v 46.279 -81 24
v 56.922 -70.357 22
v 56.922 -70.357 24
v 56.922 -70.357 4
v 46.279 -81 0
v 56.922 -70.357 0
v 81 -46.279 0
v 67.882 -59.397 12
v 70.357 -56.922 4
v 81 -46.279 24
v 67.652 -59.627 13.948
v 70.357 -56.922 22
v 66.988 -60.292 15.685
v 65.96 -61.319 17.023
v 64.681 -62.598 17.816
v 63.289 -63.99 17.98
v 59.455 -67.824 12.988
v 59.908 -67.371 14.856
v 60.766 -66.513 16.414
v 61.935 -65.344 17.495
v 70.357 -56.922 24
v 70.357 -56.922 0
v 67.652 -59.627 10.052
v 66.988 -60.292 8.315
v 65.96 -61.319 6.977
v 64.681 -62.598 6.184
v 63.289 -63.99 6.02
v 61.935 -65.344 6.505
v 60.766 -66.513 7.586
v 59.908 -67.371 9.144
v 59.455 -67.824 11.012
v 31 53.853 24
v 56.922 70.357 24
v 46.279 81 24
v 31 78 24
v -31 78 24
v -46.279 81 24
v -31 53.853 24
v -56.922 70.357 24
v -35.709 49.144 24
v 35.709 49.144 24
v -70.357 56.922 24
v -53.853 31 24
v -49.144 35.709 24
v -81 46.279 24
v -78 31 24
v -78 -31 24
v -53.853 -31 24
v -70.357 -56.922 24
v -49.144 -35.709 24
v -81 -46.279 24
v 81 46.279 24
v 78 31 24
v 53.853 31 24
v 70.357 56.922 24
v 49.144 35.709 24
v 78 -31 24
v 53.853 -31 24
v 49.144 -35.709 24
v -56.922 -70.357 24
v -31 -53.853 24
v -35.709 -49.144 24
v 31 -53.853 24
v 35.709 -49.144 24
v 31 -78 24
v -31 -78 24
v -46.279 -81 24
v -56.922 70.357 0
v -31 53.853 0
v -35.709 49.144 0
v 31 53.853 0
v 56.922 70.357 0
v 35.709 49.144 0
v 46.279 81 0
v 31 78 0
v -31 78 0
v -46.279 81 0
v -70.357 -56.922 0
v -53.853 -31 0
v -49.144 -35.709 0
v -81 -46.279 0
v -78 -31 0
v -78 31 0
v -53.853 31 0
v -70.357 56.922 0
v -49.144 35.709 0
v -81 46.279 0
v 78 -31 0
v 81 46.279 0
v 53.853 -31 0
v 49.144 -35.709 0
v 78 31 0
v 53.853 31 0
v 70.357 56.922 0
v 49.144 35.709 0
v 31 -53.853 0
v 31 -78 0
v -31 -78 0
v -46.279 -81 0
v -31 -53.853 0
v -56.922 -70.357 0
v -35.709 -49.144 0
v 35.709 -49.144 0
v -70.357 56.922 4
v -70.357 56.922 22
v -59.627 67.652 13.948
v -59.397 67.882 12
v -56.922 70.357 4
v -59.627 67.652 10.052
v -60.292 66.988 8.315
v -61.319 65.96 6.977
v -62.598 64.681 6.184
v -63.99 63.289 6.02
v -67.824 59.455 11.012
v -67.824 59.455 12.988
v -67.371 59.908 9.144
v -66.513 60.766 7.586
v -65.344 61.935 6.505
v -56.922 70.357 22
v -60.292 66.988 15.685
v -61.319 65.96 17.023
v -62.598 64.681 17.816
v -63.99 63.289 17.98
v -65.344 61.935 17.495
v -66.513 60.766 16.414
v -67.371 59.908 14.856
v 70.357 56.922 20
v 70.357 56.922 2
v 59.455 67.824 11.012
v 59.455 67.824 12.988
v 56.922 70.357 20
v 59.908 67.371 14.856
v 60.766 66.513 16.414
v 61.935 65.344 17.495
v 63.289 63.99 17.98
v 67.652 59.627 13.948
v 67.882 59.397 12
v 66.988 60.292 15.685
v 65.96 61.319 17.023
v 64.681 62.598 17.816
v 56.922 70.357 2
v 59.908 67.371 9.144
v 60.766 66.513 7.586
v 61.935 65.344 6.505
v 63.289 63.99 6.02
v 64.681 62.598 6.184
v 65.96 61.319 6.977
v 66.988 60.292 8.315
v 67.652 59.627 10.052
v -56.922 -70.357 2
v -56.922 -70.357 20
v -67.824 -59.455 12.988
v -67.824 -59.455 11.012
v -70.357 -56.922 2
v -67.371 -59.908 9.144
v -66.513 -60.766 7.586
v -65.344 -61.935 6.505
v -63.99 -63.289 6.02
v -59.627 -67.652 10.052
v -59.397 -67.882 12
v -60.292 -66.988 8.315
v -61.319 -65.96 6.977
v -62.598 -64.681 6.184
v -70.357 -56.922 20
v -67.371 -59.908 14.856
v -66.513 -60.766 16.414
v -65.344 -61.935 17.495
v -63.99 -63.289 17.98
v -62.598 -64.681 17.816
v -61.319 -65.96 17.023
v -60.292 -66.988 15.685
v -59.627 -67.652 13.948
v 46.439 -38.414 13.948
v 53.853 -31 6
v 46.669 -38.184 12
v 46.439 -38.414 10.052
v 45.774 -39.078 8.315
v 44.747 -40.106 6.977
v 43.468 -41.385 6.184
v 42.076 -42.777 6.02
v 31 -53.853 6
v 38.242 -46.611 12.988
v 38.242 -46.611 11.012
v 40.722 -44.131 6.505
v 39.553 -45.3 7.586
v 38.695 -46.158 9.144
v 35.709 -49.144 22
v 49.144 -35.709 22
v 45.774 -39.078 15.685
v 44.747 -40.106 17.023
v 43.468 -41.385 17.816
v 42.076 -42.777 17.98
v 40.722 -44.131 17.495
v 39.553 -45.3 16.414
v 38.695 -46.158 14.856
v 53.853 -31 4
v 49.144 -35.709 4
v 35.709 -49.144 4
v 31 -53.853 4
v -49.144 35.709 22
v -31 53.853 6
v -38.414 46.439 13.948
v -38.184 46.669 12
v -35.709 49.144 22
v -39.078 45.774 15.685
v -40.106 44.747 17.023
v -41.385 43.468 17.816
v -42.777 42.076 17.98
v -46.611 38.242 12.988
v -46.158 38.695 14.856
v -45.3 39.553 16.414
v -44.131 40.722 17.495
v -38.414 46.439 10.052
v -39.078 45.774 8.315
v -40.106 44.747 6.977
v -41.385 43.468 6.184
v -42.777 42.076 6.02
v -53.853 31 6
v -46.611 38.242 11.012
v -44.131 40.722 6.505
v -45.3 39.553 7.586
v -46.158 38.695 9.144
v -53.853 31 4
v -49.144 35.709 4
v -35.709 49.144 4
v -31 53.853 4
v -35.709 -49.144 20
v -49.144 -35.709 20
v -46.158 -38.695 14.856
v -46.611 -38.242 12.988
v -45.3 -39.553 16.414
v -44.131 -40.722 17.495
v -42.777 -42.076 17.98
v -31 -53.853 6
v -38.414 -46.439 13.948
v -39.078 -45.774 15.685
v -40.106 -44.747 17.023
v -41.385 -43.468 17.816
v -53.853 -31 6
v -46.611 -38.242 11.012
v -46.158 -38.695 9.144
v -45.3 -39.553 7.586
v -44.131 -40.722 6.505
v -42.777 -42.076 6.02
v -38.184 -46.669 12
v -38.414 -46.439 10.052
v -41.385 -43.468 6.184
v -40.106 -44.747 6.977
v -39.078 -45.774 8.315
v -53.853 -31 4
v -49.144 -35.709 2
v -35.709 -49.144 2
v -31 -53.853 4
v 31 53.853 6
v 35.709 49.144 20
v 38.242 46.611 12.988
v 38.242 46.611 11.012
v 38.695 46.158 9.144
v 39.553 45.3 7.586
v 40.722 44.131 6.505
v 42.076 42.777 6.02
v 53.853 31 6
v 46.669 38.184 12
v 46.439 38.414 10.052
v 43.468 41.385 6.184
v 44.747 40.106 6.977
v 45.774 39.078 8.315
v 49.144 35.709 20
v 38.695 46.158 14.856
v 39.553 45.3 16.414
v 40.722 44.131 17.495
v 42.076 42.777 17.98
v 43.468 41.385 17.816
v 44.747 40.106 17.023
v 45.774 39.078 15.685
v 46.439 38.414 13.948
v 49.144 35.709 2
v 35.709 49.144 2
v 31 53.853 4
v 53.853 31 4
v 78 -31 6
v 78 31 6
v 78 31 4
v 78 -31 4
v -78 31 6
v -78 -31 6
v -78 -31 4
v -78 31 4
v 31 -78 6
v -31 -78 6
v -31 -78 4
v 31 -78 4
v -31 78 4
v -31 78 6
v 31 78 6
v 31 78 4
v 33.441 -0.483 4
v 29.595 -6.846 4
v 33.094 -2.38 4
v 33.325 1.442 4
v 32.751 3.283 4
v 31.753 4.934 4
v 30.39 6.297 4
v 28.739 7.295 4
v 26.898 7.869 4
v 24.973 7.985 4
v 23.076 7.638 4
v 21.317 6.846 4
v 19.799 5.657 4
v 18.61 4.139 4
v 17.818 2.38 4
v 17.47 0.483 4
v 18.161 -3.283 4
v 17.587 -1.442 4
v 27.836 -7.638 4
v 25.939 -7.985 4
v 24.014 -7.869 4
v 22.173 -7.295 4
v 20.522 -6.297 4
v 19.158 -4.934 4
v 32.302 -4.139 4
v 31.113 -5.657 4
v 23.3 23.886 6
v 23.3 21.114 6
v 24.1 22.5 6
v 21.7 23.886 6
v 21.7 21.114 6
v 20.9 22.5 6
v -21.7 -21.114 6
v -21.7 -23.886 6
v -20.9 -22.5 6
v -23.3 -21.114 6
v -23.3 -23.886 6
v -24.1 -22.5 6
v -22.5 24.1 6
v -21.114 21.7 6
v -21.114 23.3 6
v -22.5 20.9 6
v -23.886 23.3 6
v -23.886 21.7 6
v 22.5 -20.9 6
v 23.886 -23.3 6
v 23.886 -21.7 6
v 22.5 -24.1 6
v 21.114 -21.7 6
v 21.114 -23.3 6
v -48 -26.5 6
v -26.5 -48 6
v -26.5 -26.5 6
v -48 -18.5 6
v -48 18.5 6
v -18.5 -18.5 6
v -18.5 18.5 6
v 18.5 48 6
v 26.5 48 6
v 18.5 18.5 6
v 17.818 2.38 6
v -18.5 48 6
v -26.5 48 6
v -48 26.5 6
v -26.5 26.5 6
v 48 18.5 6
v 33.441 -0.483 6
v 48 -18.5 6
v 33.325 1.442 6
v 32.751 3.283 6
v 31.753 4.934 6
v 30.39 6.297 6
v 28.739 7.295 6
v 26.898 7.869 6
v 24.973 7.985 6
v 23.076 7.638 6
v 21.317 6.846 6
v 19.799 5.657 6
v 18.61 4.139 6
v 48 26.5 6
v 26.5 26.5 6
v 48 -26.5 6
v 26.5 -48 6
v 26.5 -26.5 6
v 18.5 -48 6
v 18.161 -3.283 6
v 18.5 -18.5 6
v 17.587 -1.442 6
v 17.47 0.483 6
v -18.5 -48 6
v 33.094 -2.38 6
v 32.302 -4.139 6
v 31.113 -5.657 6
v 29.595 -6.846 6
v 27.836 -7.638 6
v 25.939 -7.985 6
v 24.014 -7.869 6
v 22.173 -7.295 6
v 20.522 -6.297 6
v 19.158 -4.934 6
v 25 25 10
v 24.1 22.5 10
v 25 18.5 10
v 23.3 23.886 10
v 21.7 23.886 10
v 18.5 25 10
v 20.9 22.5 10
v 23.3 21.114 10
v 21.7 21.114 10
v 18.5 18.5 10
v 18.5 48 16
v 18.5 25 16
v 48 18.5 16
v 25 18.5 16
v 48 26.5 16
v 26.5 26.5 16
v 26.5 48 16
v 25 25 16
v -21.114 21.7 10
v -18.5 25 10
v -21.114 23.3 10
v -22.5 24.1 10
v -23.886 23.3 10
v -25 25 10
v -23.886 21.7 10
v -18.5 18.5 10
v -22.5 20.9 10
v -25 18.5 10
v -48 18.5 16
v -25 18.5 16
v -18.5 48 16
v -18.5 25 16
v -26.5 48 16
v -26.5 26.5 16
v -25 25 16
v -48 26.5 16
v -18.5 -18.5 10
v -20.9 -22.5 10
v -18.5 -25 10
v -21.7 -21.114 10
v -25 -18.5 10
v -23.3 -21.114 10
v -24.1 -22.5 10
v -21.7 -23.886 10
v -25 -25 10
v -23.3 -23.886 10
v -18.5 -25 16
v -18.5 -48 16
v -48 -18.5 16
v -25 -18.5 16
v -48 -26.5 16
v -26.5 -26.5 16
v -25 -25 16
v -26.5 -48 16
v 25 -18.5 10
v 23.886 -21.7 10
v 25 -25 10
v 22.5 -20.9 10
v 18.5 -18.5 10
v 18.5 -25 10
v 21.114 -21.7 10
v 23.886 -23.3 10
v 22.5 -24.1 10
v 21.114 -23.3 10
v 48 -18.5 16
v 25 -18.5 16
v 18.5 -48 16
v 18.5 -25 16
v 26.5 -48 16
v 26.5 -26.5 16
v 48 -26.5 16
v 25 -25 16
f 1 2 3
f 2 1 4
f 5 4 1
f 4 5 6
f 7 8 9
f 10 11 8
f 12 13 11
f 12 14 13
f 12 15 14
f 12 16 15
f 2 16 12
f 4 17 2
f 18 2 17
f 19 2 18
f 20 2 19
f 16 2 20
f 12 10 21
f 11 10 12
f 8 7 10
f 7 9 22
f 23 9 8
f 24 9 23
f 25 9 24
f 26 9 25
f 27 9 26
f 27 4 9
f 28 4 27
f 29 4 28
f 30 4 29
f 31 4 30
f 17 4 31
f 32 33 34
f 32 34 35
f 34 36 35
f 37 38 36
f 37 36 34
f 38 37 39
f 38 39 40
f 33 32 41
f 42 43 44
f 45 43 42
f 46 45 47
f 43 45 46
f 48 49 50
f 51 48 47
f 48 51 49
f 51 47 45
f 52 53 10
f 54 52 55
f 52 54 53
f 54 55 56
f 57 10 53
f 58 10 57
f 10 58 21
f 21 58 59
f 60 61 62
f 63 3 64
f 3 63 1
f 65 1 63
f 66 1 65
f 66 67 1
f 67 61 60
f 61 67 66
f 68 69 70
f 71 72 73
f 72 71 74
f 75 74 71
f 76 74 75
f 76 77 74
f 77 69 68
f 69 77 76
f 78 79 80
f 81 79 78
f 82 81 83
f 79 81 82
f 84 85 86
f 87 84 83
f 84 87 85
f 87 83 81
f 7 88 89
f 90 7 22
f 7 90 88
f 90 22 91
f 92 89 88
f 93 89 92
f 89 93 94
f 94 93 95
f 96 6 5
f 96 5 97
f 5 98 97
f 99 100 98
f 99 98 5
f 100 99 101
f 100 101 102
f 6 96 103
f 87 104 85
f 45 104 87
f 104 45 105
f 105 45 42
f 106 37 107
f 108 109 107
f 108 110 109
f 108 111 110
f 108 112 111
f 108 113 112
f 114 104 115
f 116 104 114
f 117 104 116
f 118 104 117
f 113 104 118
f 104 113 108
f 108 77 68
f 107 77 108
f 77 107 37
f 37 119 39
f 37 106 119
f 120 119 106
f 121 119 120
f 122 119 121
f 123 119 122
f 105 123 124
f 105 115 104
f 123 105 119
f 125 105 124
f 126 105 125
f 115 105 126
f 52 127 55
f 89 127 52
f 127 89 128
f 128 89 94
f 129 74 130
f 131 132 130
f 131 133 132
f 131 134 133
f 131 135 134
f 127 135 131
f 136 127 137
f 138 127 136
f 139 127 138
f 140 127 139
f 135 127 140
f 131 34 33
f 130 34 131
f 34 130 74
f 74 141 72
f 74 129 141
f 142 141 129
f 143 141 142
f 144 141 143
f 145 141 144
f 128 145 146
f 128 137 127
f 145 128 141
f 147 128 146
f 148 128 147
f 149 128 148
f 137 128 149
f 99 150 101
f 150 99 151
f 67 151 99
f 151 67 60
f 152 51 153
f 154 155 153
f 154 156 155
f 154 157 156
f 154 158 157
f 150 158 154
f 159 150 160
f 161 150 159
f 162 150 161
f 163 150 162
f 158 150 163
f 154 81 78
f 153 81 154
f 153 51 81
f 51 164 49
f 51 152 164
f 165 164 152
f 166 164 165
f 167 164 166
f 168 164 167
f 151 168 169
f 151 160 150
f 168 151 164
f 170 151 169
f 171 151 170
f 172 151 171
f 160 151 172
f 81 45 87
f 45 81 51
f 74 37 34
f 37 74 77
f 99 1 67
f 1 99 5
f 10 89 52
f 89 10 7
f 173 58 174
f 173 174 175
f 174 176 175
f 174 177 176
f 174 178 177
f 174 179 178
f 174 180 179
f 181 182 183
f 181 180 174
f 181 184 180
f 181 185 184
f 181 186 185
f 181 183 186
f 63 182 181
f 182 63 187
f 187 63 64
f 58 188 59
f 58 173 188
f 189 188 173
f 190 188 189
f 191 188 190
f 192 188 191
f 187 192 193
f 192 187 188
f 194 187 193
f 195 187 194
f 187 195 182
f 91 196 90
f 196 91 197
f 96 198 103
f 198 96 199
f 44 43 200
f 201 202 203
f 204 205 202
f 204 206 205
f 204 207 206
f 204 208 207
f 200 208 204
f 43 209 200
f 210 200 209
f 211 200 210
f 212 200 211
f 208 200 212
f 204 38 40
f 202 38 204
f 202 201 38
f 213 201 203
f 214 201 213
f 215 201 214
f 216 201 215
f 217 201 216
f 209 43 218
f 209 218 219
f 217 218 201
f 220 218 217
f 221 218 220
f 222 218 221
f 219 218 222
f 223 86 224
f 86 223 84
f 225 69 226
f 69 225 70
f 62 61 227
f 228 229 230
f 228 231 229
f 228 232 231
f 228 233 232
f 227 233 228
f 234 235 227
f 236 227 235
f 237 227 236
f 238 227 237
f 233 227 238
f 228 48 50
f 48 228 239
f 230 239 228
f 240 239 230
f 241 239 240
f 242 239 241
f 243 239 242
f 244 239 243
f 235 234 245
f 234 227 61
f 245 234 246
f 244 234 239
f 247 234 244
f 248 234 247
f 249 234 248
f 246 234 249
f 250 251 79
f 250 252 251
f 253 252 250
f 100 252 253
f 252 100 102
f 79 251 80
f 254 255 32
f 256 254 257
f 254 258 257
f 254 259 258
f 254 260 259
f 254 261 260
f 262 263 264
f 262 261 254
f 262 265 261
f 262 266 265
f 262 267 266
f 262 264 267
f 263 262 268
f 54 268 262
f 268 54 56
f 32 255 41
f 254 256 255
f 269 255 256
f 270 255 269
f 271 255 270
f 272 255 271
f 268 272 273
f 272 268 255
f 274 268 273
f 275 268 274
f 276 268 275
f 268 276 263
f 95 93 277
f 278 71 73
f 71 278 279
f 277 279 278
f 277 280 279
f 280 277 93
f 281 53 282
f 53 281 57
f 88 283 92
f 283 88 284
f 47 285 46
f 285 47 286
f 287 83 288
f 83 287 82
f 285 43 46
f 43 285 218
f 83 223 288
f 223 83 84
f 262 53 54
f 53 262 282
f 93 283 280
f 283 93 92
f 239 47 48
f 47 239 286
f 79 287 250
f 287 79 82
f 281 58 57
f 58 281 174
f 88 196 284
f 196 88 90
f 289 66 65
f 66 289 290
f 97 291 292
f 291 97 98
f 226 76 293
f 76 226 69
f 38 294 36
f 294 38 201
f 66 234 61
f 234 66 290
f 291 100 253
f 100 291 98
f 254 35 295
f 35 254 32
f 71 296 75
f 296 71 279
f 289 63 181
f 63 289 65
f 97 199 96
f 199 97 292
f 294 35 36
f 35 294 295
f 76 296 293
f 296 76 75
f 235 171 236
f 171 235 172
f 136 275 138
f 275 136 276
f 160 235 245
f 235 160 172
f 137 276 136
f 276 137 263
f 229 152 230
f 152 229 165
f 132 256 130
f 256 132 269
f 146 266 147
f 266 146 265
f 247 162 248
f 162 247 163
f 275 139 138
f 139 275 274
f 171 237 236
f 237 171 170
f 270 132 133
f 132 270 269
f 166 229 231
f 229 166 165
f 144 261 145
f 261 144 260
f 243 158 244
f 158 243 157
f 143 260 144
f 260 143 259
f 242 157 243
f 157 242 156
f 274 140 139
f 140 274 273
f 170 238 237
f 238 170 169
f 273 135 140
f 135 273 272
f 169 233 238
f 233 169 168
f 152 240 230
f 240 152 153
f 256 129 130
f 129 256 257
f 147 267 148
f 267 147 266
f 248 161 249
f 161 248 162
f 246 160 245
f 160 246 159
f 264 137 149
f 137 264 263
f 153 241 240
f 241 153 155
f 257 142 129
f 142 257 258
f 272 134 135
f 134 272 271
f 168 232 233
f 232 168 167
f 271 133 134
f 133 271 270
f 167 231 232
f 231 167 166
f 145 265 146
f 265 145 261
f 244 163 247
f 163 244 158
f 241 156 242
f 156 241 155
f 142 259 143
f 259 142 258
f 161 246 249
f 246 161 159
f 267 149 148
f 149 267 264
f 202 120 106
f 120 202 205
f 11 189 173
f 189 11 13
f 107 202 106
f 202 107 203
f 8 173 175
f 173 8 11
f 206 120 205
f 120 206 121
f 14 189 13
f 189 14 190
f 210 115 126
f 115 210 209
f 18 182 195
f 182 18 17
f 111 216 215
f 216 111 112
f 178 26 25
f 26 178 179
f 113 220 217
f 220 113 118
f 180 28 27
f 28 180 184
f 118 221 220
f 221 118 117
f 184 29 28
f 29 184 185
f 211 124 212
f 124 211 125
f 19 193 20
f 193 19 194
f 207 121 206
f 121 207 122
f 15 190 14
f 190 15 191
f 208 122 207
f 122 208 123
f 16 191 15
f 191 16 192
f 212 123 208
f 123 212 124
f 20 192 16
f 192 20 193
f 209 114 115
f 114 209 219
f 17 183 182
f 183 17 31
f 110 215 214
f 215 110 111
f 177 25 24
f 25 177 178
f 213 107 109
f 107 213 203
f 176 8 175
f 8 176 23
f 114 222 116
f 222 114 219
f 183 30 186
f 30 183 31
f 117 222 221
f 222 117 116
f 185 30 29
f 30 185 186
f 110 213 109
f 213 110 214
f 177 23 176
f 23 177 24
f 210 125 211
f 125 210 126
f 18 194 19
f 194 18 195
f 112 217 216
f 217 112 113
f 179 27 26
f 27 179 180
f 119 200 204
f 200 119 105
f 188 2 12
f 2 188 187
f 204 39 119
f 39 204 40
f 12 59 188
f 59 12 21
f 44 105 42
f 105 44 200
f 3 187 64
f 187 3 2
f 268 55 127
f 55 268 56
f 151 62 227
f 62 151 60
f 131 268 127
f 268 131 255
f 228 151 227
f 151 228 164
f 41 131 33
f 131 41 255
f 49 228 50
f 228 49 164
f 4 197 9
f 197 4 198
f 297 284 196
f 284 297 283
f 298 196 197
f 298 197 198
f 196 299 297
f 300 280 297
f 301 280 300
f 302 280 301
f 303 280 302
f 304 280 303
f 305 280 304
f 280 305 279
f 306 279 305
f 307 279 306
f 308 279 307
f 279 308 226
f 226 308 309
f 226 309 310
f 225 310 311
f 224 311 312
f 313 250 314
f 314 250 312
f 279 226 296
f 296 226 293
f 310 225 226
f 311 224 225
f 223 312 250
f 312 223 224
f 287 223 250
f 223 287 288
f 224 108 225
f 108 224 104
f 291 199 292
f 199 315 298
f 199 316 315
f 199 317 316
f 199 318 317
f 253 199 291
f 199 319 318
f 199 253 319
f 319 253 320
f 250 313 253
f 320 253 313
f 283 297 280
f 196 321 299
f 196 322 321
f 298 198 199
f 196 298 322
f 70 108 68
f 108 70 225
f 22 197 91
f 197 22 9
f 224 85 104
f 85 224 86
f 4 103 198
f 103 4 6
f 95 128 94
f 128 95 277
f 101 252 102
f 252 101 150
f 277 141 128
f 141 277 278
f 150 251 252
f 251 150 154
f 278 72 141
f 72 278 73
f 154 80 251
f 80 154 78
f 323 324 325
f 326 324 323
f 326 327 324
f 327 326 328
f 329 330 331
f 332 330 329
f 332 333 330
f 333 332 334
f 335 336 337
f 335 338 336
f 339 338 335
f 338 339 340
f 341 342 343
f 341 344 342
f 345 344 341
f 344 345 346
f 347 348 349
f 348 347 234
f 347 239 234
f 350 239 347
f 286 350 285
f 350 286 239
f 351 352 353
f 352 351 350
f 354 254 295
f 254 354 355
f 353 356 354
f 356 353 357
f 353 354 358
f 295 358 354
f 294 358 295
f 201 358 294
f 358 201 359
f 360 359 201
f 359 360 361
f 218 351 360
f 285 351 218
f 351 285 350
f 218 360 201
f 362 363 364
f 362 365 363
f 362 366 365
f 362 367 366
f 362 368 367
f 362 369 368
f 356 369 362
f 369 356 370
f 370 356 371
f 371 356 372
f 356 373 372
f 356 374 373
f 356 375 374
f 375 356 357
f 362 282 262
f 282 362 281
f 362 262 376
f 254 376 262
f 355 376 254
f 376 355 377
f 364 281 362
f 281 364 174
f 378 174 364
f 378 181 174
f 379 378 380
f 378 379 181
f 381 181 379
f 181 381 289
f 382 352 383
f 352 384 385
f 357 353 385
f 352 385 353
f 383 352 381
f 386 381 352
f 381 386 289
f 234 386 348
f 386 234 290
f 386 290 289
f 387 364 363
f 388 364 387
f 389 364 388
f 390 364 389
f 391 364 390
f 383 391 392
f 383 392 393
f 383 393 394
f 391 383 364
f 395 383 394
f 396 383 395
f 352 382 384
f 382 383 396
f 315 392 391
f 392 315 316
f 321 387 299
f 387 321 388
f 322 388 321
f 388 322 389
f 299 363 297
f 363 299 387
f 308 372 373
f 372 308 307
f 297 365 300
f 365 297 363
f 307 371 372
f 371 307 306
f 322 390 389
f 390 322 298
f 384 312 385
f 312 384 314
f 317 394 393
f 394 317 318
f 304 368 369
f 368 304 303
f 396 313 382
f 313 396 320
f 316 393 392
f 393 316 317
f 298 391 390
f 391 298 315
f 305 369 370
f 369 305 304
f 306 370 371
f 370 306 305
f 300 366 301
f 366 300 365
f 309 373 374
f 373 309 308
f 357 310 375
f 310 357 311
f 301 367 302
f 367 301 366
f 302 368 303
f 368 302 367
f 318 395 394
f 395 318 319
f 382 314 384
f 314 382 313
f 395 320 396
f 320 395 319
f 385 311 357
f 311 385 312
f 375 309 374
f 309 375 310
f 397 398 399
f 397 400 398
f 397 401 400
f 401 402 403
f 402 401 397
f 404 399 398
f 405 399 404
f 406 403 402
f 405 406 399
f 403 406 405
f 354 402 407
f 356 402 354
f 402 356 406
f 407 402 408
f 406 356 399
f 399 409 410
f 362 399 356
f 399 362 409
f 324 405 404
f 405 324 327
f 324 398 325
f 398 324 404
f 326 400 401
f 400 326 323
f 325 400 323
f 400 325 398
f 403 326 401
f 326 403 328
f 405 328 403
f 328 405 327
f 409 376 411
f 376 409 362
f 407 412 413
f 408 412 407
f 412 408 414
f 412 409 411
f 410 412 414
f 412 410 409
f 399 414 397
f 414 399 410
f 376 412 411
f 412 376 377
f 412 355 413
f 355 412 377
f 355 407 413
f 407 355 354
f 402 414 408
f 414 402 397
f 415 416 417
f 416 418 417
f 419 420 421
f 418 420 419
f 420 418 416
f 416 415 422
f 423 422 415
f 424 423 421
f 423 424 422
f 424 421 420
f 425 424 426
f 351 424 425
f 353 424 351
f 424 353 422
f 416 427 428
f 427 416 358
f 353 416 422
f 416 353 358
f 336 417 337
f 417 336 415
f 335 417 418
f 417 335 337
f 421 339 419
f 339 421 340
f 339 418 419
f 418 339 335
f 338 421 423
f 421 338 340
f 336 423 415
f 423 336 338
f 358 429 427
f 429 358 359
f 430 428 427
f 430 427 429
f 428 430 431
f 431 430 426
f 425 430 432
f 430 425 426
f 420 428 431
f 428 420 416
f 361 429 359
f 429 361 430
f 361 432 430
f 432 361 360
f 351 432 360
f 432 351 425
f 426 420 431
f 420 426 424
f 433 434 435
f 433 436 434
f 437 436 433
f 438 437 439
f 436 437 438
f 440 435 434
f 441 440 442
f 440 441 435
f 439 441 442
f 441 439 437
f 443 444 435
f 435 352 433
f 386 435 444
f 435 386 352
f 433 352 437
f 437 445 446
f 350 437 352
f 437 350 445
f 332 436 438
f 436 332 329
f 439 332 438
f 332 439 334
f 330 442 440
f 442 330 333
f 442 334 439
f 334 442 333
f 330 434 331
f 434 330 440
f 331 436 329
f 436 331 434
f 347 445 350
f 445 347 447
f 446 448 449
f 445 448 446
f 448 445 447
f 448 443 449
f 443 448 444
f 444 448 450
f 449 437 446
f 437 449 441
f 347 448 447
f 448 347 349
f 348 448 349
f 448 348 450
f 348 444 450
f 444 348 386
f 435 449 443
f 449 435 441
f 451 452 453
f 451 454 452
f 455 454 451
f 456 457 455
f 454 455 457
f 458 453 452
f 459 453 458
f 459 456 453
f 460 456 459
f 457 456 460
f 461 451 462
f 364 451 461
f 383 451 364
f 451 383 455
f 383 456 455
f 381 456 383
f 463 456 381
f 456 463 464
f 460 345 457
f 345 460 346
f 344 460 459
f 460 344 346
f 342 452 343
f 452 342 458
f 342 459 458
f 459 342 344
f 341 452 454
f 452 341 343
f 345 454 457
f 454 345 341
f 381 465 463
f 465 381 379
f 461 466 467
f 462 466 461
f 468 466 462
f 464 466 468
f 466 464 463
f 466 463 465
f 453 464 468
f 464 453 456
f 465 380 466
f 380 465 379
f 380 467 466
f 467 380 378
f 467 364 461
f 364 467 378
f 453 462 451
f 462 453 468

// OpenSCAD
// file: ../lib/JMO_library.scad
/* MAGNOLIO QUADCOPTER

FILE: JMO_library.scad

AUTHOR: Jose Manuel Ortiz

DESCRIPTION:
General purpose primitive modules

LICENSE:
Magnolio by Kinamics is licensed under a Creative Commons Attribution-ShareAlike 4.0 International License.
http://creativecommons.org/licenses/by-sa/4.0/
*/

//an open case with open base, wall width d and chamfer specified by d1
module case_base_open(l=160, h=32, w=55, d=4, d1=2){
	h1 = sqrt(w*w/4+h*h);
	h2 = h1-d1-d;
	x1 = w*h1/(2*h2);
	y1 = h*h1/h2;
	x2 = d1*w/(2*h1);
	alpha = atan(2*h/w);
	//echo("h1=",h1," h2=",h2," x1=",x1," y1=",y1," x2=",x2, " alpha=",alpha);
	
	rotate([90,0,0])
	translate([0,0,-l/2])
	difference(){
		union(){
			//main box
			translate([w/2,0,0]) cube([d,h,l]);
			translate([0,d/2+h,l/2]) cube([w+2*d,d,l],center=true);
			translate([-w/2-d,0,0]) cube([d,h,l]);
			
			//chamfers
			rotate([0,0,90-alpha])
				translate([0,h2+d/2+d,l/2])
					cube([2*x2+2*d,d,l],center=true);
			rotate([0,0,-90+alpha])
				translate([0,h2+d/2+d,l/2])
					cube([2*x2+2*d,d,l],center=true);
		}
		//remove excess
		rotate([0,0,90-alpha])
				translate([0,h2+3*d,l/2])
					cube([2*x2+2*d,2*d,l+1],center=true);
		rotate([0,0,-90+alpha])
				translate([0,h2+3*d,l/2])
					cube([2*x2+2*d,2*d,l+1],center=true);
		translate([w/2+d,0,-0.5]) cube([d,h+2*d,l+1]);
		translate([0,d+d/2+h,l/2]) cube([w+2*d,d,l+1],center=true);
		translate([-w/2-2*d,0,-0.5]) cube([d,h+3*d,l+1]);
	}
}
//case_base_open();

//Pyramid module: generalization of Openscad manual example
module pyramid_square_base(w=10, l=10, h=10){
	polyhedron(
		points=[ [w/2,l/2,0],[w/2,-l/2,0],[-w/2,-l/2,0],[-w/2,l/2,0], // the four points at base
           [0,0,h]  ],                                 // the apex point 
  faces=[ [0,1,4],[1,2,4],[2,3,4],[3,0,4],              // each triangle side
              [1,0,3],[2,1,3] ]);                         // two triangles for square base
}
//pyramid_square_base(w=150, l=150, h=60);
// main file
/*
Drone Main Body

Print settings (Sli3r v1.1.7):
- Black ABS, 3mm filament
- layer height: 0.3
- perimeters: 4
- Solid layers: 4 (top), 4 (bottom)
- Infill: 25% honeycomb
- Speed: 50mm/s (permeters), 80mm/s (infill)
- Support Material:
	- Overhang threshold: 85º
	- Pattern: rectilinear
- Temperature: 240ºC (extruder), 120ºC (bed)

Other info:
- 3mm glass bed with kapton tape
- nozzle diameter: 0.35mm
- bed size: 170 (x), 180 (y)
- G-Code flavor: RepRap Marlin

*/

include <../Magnolio_parts.scad>

drone_body_main();
